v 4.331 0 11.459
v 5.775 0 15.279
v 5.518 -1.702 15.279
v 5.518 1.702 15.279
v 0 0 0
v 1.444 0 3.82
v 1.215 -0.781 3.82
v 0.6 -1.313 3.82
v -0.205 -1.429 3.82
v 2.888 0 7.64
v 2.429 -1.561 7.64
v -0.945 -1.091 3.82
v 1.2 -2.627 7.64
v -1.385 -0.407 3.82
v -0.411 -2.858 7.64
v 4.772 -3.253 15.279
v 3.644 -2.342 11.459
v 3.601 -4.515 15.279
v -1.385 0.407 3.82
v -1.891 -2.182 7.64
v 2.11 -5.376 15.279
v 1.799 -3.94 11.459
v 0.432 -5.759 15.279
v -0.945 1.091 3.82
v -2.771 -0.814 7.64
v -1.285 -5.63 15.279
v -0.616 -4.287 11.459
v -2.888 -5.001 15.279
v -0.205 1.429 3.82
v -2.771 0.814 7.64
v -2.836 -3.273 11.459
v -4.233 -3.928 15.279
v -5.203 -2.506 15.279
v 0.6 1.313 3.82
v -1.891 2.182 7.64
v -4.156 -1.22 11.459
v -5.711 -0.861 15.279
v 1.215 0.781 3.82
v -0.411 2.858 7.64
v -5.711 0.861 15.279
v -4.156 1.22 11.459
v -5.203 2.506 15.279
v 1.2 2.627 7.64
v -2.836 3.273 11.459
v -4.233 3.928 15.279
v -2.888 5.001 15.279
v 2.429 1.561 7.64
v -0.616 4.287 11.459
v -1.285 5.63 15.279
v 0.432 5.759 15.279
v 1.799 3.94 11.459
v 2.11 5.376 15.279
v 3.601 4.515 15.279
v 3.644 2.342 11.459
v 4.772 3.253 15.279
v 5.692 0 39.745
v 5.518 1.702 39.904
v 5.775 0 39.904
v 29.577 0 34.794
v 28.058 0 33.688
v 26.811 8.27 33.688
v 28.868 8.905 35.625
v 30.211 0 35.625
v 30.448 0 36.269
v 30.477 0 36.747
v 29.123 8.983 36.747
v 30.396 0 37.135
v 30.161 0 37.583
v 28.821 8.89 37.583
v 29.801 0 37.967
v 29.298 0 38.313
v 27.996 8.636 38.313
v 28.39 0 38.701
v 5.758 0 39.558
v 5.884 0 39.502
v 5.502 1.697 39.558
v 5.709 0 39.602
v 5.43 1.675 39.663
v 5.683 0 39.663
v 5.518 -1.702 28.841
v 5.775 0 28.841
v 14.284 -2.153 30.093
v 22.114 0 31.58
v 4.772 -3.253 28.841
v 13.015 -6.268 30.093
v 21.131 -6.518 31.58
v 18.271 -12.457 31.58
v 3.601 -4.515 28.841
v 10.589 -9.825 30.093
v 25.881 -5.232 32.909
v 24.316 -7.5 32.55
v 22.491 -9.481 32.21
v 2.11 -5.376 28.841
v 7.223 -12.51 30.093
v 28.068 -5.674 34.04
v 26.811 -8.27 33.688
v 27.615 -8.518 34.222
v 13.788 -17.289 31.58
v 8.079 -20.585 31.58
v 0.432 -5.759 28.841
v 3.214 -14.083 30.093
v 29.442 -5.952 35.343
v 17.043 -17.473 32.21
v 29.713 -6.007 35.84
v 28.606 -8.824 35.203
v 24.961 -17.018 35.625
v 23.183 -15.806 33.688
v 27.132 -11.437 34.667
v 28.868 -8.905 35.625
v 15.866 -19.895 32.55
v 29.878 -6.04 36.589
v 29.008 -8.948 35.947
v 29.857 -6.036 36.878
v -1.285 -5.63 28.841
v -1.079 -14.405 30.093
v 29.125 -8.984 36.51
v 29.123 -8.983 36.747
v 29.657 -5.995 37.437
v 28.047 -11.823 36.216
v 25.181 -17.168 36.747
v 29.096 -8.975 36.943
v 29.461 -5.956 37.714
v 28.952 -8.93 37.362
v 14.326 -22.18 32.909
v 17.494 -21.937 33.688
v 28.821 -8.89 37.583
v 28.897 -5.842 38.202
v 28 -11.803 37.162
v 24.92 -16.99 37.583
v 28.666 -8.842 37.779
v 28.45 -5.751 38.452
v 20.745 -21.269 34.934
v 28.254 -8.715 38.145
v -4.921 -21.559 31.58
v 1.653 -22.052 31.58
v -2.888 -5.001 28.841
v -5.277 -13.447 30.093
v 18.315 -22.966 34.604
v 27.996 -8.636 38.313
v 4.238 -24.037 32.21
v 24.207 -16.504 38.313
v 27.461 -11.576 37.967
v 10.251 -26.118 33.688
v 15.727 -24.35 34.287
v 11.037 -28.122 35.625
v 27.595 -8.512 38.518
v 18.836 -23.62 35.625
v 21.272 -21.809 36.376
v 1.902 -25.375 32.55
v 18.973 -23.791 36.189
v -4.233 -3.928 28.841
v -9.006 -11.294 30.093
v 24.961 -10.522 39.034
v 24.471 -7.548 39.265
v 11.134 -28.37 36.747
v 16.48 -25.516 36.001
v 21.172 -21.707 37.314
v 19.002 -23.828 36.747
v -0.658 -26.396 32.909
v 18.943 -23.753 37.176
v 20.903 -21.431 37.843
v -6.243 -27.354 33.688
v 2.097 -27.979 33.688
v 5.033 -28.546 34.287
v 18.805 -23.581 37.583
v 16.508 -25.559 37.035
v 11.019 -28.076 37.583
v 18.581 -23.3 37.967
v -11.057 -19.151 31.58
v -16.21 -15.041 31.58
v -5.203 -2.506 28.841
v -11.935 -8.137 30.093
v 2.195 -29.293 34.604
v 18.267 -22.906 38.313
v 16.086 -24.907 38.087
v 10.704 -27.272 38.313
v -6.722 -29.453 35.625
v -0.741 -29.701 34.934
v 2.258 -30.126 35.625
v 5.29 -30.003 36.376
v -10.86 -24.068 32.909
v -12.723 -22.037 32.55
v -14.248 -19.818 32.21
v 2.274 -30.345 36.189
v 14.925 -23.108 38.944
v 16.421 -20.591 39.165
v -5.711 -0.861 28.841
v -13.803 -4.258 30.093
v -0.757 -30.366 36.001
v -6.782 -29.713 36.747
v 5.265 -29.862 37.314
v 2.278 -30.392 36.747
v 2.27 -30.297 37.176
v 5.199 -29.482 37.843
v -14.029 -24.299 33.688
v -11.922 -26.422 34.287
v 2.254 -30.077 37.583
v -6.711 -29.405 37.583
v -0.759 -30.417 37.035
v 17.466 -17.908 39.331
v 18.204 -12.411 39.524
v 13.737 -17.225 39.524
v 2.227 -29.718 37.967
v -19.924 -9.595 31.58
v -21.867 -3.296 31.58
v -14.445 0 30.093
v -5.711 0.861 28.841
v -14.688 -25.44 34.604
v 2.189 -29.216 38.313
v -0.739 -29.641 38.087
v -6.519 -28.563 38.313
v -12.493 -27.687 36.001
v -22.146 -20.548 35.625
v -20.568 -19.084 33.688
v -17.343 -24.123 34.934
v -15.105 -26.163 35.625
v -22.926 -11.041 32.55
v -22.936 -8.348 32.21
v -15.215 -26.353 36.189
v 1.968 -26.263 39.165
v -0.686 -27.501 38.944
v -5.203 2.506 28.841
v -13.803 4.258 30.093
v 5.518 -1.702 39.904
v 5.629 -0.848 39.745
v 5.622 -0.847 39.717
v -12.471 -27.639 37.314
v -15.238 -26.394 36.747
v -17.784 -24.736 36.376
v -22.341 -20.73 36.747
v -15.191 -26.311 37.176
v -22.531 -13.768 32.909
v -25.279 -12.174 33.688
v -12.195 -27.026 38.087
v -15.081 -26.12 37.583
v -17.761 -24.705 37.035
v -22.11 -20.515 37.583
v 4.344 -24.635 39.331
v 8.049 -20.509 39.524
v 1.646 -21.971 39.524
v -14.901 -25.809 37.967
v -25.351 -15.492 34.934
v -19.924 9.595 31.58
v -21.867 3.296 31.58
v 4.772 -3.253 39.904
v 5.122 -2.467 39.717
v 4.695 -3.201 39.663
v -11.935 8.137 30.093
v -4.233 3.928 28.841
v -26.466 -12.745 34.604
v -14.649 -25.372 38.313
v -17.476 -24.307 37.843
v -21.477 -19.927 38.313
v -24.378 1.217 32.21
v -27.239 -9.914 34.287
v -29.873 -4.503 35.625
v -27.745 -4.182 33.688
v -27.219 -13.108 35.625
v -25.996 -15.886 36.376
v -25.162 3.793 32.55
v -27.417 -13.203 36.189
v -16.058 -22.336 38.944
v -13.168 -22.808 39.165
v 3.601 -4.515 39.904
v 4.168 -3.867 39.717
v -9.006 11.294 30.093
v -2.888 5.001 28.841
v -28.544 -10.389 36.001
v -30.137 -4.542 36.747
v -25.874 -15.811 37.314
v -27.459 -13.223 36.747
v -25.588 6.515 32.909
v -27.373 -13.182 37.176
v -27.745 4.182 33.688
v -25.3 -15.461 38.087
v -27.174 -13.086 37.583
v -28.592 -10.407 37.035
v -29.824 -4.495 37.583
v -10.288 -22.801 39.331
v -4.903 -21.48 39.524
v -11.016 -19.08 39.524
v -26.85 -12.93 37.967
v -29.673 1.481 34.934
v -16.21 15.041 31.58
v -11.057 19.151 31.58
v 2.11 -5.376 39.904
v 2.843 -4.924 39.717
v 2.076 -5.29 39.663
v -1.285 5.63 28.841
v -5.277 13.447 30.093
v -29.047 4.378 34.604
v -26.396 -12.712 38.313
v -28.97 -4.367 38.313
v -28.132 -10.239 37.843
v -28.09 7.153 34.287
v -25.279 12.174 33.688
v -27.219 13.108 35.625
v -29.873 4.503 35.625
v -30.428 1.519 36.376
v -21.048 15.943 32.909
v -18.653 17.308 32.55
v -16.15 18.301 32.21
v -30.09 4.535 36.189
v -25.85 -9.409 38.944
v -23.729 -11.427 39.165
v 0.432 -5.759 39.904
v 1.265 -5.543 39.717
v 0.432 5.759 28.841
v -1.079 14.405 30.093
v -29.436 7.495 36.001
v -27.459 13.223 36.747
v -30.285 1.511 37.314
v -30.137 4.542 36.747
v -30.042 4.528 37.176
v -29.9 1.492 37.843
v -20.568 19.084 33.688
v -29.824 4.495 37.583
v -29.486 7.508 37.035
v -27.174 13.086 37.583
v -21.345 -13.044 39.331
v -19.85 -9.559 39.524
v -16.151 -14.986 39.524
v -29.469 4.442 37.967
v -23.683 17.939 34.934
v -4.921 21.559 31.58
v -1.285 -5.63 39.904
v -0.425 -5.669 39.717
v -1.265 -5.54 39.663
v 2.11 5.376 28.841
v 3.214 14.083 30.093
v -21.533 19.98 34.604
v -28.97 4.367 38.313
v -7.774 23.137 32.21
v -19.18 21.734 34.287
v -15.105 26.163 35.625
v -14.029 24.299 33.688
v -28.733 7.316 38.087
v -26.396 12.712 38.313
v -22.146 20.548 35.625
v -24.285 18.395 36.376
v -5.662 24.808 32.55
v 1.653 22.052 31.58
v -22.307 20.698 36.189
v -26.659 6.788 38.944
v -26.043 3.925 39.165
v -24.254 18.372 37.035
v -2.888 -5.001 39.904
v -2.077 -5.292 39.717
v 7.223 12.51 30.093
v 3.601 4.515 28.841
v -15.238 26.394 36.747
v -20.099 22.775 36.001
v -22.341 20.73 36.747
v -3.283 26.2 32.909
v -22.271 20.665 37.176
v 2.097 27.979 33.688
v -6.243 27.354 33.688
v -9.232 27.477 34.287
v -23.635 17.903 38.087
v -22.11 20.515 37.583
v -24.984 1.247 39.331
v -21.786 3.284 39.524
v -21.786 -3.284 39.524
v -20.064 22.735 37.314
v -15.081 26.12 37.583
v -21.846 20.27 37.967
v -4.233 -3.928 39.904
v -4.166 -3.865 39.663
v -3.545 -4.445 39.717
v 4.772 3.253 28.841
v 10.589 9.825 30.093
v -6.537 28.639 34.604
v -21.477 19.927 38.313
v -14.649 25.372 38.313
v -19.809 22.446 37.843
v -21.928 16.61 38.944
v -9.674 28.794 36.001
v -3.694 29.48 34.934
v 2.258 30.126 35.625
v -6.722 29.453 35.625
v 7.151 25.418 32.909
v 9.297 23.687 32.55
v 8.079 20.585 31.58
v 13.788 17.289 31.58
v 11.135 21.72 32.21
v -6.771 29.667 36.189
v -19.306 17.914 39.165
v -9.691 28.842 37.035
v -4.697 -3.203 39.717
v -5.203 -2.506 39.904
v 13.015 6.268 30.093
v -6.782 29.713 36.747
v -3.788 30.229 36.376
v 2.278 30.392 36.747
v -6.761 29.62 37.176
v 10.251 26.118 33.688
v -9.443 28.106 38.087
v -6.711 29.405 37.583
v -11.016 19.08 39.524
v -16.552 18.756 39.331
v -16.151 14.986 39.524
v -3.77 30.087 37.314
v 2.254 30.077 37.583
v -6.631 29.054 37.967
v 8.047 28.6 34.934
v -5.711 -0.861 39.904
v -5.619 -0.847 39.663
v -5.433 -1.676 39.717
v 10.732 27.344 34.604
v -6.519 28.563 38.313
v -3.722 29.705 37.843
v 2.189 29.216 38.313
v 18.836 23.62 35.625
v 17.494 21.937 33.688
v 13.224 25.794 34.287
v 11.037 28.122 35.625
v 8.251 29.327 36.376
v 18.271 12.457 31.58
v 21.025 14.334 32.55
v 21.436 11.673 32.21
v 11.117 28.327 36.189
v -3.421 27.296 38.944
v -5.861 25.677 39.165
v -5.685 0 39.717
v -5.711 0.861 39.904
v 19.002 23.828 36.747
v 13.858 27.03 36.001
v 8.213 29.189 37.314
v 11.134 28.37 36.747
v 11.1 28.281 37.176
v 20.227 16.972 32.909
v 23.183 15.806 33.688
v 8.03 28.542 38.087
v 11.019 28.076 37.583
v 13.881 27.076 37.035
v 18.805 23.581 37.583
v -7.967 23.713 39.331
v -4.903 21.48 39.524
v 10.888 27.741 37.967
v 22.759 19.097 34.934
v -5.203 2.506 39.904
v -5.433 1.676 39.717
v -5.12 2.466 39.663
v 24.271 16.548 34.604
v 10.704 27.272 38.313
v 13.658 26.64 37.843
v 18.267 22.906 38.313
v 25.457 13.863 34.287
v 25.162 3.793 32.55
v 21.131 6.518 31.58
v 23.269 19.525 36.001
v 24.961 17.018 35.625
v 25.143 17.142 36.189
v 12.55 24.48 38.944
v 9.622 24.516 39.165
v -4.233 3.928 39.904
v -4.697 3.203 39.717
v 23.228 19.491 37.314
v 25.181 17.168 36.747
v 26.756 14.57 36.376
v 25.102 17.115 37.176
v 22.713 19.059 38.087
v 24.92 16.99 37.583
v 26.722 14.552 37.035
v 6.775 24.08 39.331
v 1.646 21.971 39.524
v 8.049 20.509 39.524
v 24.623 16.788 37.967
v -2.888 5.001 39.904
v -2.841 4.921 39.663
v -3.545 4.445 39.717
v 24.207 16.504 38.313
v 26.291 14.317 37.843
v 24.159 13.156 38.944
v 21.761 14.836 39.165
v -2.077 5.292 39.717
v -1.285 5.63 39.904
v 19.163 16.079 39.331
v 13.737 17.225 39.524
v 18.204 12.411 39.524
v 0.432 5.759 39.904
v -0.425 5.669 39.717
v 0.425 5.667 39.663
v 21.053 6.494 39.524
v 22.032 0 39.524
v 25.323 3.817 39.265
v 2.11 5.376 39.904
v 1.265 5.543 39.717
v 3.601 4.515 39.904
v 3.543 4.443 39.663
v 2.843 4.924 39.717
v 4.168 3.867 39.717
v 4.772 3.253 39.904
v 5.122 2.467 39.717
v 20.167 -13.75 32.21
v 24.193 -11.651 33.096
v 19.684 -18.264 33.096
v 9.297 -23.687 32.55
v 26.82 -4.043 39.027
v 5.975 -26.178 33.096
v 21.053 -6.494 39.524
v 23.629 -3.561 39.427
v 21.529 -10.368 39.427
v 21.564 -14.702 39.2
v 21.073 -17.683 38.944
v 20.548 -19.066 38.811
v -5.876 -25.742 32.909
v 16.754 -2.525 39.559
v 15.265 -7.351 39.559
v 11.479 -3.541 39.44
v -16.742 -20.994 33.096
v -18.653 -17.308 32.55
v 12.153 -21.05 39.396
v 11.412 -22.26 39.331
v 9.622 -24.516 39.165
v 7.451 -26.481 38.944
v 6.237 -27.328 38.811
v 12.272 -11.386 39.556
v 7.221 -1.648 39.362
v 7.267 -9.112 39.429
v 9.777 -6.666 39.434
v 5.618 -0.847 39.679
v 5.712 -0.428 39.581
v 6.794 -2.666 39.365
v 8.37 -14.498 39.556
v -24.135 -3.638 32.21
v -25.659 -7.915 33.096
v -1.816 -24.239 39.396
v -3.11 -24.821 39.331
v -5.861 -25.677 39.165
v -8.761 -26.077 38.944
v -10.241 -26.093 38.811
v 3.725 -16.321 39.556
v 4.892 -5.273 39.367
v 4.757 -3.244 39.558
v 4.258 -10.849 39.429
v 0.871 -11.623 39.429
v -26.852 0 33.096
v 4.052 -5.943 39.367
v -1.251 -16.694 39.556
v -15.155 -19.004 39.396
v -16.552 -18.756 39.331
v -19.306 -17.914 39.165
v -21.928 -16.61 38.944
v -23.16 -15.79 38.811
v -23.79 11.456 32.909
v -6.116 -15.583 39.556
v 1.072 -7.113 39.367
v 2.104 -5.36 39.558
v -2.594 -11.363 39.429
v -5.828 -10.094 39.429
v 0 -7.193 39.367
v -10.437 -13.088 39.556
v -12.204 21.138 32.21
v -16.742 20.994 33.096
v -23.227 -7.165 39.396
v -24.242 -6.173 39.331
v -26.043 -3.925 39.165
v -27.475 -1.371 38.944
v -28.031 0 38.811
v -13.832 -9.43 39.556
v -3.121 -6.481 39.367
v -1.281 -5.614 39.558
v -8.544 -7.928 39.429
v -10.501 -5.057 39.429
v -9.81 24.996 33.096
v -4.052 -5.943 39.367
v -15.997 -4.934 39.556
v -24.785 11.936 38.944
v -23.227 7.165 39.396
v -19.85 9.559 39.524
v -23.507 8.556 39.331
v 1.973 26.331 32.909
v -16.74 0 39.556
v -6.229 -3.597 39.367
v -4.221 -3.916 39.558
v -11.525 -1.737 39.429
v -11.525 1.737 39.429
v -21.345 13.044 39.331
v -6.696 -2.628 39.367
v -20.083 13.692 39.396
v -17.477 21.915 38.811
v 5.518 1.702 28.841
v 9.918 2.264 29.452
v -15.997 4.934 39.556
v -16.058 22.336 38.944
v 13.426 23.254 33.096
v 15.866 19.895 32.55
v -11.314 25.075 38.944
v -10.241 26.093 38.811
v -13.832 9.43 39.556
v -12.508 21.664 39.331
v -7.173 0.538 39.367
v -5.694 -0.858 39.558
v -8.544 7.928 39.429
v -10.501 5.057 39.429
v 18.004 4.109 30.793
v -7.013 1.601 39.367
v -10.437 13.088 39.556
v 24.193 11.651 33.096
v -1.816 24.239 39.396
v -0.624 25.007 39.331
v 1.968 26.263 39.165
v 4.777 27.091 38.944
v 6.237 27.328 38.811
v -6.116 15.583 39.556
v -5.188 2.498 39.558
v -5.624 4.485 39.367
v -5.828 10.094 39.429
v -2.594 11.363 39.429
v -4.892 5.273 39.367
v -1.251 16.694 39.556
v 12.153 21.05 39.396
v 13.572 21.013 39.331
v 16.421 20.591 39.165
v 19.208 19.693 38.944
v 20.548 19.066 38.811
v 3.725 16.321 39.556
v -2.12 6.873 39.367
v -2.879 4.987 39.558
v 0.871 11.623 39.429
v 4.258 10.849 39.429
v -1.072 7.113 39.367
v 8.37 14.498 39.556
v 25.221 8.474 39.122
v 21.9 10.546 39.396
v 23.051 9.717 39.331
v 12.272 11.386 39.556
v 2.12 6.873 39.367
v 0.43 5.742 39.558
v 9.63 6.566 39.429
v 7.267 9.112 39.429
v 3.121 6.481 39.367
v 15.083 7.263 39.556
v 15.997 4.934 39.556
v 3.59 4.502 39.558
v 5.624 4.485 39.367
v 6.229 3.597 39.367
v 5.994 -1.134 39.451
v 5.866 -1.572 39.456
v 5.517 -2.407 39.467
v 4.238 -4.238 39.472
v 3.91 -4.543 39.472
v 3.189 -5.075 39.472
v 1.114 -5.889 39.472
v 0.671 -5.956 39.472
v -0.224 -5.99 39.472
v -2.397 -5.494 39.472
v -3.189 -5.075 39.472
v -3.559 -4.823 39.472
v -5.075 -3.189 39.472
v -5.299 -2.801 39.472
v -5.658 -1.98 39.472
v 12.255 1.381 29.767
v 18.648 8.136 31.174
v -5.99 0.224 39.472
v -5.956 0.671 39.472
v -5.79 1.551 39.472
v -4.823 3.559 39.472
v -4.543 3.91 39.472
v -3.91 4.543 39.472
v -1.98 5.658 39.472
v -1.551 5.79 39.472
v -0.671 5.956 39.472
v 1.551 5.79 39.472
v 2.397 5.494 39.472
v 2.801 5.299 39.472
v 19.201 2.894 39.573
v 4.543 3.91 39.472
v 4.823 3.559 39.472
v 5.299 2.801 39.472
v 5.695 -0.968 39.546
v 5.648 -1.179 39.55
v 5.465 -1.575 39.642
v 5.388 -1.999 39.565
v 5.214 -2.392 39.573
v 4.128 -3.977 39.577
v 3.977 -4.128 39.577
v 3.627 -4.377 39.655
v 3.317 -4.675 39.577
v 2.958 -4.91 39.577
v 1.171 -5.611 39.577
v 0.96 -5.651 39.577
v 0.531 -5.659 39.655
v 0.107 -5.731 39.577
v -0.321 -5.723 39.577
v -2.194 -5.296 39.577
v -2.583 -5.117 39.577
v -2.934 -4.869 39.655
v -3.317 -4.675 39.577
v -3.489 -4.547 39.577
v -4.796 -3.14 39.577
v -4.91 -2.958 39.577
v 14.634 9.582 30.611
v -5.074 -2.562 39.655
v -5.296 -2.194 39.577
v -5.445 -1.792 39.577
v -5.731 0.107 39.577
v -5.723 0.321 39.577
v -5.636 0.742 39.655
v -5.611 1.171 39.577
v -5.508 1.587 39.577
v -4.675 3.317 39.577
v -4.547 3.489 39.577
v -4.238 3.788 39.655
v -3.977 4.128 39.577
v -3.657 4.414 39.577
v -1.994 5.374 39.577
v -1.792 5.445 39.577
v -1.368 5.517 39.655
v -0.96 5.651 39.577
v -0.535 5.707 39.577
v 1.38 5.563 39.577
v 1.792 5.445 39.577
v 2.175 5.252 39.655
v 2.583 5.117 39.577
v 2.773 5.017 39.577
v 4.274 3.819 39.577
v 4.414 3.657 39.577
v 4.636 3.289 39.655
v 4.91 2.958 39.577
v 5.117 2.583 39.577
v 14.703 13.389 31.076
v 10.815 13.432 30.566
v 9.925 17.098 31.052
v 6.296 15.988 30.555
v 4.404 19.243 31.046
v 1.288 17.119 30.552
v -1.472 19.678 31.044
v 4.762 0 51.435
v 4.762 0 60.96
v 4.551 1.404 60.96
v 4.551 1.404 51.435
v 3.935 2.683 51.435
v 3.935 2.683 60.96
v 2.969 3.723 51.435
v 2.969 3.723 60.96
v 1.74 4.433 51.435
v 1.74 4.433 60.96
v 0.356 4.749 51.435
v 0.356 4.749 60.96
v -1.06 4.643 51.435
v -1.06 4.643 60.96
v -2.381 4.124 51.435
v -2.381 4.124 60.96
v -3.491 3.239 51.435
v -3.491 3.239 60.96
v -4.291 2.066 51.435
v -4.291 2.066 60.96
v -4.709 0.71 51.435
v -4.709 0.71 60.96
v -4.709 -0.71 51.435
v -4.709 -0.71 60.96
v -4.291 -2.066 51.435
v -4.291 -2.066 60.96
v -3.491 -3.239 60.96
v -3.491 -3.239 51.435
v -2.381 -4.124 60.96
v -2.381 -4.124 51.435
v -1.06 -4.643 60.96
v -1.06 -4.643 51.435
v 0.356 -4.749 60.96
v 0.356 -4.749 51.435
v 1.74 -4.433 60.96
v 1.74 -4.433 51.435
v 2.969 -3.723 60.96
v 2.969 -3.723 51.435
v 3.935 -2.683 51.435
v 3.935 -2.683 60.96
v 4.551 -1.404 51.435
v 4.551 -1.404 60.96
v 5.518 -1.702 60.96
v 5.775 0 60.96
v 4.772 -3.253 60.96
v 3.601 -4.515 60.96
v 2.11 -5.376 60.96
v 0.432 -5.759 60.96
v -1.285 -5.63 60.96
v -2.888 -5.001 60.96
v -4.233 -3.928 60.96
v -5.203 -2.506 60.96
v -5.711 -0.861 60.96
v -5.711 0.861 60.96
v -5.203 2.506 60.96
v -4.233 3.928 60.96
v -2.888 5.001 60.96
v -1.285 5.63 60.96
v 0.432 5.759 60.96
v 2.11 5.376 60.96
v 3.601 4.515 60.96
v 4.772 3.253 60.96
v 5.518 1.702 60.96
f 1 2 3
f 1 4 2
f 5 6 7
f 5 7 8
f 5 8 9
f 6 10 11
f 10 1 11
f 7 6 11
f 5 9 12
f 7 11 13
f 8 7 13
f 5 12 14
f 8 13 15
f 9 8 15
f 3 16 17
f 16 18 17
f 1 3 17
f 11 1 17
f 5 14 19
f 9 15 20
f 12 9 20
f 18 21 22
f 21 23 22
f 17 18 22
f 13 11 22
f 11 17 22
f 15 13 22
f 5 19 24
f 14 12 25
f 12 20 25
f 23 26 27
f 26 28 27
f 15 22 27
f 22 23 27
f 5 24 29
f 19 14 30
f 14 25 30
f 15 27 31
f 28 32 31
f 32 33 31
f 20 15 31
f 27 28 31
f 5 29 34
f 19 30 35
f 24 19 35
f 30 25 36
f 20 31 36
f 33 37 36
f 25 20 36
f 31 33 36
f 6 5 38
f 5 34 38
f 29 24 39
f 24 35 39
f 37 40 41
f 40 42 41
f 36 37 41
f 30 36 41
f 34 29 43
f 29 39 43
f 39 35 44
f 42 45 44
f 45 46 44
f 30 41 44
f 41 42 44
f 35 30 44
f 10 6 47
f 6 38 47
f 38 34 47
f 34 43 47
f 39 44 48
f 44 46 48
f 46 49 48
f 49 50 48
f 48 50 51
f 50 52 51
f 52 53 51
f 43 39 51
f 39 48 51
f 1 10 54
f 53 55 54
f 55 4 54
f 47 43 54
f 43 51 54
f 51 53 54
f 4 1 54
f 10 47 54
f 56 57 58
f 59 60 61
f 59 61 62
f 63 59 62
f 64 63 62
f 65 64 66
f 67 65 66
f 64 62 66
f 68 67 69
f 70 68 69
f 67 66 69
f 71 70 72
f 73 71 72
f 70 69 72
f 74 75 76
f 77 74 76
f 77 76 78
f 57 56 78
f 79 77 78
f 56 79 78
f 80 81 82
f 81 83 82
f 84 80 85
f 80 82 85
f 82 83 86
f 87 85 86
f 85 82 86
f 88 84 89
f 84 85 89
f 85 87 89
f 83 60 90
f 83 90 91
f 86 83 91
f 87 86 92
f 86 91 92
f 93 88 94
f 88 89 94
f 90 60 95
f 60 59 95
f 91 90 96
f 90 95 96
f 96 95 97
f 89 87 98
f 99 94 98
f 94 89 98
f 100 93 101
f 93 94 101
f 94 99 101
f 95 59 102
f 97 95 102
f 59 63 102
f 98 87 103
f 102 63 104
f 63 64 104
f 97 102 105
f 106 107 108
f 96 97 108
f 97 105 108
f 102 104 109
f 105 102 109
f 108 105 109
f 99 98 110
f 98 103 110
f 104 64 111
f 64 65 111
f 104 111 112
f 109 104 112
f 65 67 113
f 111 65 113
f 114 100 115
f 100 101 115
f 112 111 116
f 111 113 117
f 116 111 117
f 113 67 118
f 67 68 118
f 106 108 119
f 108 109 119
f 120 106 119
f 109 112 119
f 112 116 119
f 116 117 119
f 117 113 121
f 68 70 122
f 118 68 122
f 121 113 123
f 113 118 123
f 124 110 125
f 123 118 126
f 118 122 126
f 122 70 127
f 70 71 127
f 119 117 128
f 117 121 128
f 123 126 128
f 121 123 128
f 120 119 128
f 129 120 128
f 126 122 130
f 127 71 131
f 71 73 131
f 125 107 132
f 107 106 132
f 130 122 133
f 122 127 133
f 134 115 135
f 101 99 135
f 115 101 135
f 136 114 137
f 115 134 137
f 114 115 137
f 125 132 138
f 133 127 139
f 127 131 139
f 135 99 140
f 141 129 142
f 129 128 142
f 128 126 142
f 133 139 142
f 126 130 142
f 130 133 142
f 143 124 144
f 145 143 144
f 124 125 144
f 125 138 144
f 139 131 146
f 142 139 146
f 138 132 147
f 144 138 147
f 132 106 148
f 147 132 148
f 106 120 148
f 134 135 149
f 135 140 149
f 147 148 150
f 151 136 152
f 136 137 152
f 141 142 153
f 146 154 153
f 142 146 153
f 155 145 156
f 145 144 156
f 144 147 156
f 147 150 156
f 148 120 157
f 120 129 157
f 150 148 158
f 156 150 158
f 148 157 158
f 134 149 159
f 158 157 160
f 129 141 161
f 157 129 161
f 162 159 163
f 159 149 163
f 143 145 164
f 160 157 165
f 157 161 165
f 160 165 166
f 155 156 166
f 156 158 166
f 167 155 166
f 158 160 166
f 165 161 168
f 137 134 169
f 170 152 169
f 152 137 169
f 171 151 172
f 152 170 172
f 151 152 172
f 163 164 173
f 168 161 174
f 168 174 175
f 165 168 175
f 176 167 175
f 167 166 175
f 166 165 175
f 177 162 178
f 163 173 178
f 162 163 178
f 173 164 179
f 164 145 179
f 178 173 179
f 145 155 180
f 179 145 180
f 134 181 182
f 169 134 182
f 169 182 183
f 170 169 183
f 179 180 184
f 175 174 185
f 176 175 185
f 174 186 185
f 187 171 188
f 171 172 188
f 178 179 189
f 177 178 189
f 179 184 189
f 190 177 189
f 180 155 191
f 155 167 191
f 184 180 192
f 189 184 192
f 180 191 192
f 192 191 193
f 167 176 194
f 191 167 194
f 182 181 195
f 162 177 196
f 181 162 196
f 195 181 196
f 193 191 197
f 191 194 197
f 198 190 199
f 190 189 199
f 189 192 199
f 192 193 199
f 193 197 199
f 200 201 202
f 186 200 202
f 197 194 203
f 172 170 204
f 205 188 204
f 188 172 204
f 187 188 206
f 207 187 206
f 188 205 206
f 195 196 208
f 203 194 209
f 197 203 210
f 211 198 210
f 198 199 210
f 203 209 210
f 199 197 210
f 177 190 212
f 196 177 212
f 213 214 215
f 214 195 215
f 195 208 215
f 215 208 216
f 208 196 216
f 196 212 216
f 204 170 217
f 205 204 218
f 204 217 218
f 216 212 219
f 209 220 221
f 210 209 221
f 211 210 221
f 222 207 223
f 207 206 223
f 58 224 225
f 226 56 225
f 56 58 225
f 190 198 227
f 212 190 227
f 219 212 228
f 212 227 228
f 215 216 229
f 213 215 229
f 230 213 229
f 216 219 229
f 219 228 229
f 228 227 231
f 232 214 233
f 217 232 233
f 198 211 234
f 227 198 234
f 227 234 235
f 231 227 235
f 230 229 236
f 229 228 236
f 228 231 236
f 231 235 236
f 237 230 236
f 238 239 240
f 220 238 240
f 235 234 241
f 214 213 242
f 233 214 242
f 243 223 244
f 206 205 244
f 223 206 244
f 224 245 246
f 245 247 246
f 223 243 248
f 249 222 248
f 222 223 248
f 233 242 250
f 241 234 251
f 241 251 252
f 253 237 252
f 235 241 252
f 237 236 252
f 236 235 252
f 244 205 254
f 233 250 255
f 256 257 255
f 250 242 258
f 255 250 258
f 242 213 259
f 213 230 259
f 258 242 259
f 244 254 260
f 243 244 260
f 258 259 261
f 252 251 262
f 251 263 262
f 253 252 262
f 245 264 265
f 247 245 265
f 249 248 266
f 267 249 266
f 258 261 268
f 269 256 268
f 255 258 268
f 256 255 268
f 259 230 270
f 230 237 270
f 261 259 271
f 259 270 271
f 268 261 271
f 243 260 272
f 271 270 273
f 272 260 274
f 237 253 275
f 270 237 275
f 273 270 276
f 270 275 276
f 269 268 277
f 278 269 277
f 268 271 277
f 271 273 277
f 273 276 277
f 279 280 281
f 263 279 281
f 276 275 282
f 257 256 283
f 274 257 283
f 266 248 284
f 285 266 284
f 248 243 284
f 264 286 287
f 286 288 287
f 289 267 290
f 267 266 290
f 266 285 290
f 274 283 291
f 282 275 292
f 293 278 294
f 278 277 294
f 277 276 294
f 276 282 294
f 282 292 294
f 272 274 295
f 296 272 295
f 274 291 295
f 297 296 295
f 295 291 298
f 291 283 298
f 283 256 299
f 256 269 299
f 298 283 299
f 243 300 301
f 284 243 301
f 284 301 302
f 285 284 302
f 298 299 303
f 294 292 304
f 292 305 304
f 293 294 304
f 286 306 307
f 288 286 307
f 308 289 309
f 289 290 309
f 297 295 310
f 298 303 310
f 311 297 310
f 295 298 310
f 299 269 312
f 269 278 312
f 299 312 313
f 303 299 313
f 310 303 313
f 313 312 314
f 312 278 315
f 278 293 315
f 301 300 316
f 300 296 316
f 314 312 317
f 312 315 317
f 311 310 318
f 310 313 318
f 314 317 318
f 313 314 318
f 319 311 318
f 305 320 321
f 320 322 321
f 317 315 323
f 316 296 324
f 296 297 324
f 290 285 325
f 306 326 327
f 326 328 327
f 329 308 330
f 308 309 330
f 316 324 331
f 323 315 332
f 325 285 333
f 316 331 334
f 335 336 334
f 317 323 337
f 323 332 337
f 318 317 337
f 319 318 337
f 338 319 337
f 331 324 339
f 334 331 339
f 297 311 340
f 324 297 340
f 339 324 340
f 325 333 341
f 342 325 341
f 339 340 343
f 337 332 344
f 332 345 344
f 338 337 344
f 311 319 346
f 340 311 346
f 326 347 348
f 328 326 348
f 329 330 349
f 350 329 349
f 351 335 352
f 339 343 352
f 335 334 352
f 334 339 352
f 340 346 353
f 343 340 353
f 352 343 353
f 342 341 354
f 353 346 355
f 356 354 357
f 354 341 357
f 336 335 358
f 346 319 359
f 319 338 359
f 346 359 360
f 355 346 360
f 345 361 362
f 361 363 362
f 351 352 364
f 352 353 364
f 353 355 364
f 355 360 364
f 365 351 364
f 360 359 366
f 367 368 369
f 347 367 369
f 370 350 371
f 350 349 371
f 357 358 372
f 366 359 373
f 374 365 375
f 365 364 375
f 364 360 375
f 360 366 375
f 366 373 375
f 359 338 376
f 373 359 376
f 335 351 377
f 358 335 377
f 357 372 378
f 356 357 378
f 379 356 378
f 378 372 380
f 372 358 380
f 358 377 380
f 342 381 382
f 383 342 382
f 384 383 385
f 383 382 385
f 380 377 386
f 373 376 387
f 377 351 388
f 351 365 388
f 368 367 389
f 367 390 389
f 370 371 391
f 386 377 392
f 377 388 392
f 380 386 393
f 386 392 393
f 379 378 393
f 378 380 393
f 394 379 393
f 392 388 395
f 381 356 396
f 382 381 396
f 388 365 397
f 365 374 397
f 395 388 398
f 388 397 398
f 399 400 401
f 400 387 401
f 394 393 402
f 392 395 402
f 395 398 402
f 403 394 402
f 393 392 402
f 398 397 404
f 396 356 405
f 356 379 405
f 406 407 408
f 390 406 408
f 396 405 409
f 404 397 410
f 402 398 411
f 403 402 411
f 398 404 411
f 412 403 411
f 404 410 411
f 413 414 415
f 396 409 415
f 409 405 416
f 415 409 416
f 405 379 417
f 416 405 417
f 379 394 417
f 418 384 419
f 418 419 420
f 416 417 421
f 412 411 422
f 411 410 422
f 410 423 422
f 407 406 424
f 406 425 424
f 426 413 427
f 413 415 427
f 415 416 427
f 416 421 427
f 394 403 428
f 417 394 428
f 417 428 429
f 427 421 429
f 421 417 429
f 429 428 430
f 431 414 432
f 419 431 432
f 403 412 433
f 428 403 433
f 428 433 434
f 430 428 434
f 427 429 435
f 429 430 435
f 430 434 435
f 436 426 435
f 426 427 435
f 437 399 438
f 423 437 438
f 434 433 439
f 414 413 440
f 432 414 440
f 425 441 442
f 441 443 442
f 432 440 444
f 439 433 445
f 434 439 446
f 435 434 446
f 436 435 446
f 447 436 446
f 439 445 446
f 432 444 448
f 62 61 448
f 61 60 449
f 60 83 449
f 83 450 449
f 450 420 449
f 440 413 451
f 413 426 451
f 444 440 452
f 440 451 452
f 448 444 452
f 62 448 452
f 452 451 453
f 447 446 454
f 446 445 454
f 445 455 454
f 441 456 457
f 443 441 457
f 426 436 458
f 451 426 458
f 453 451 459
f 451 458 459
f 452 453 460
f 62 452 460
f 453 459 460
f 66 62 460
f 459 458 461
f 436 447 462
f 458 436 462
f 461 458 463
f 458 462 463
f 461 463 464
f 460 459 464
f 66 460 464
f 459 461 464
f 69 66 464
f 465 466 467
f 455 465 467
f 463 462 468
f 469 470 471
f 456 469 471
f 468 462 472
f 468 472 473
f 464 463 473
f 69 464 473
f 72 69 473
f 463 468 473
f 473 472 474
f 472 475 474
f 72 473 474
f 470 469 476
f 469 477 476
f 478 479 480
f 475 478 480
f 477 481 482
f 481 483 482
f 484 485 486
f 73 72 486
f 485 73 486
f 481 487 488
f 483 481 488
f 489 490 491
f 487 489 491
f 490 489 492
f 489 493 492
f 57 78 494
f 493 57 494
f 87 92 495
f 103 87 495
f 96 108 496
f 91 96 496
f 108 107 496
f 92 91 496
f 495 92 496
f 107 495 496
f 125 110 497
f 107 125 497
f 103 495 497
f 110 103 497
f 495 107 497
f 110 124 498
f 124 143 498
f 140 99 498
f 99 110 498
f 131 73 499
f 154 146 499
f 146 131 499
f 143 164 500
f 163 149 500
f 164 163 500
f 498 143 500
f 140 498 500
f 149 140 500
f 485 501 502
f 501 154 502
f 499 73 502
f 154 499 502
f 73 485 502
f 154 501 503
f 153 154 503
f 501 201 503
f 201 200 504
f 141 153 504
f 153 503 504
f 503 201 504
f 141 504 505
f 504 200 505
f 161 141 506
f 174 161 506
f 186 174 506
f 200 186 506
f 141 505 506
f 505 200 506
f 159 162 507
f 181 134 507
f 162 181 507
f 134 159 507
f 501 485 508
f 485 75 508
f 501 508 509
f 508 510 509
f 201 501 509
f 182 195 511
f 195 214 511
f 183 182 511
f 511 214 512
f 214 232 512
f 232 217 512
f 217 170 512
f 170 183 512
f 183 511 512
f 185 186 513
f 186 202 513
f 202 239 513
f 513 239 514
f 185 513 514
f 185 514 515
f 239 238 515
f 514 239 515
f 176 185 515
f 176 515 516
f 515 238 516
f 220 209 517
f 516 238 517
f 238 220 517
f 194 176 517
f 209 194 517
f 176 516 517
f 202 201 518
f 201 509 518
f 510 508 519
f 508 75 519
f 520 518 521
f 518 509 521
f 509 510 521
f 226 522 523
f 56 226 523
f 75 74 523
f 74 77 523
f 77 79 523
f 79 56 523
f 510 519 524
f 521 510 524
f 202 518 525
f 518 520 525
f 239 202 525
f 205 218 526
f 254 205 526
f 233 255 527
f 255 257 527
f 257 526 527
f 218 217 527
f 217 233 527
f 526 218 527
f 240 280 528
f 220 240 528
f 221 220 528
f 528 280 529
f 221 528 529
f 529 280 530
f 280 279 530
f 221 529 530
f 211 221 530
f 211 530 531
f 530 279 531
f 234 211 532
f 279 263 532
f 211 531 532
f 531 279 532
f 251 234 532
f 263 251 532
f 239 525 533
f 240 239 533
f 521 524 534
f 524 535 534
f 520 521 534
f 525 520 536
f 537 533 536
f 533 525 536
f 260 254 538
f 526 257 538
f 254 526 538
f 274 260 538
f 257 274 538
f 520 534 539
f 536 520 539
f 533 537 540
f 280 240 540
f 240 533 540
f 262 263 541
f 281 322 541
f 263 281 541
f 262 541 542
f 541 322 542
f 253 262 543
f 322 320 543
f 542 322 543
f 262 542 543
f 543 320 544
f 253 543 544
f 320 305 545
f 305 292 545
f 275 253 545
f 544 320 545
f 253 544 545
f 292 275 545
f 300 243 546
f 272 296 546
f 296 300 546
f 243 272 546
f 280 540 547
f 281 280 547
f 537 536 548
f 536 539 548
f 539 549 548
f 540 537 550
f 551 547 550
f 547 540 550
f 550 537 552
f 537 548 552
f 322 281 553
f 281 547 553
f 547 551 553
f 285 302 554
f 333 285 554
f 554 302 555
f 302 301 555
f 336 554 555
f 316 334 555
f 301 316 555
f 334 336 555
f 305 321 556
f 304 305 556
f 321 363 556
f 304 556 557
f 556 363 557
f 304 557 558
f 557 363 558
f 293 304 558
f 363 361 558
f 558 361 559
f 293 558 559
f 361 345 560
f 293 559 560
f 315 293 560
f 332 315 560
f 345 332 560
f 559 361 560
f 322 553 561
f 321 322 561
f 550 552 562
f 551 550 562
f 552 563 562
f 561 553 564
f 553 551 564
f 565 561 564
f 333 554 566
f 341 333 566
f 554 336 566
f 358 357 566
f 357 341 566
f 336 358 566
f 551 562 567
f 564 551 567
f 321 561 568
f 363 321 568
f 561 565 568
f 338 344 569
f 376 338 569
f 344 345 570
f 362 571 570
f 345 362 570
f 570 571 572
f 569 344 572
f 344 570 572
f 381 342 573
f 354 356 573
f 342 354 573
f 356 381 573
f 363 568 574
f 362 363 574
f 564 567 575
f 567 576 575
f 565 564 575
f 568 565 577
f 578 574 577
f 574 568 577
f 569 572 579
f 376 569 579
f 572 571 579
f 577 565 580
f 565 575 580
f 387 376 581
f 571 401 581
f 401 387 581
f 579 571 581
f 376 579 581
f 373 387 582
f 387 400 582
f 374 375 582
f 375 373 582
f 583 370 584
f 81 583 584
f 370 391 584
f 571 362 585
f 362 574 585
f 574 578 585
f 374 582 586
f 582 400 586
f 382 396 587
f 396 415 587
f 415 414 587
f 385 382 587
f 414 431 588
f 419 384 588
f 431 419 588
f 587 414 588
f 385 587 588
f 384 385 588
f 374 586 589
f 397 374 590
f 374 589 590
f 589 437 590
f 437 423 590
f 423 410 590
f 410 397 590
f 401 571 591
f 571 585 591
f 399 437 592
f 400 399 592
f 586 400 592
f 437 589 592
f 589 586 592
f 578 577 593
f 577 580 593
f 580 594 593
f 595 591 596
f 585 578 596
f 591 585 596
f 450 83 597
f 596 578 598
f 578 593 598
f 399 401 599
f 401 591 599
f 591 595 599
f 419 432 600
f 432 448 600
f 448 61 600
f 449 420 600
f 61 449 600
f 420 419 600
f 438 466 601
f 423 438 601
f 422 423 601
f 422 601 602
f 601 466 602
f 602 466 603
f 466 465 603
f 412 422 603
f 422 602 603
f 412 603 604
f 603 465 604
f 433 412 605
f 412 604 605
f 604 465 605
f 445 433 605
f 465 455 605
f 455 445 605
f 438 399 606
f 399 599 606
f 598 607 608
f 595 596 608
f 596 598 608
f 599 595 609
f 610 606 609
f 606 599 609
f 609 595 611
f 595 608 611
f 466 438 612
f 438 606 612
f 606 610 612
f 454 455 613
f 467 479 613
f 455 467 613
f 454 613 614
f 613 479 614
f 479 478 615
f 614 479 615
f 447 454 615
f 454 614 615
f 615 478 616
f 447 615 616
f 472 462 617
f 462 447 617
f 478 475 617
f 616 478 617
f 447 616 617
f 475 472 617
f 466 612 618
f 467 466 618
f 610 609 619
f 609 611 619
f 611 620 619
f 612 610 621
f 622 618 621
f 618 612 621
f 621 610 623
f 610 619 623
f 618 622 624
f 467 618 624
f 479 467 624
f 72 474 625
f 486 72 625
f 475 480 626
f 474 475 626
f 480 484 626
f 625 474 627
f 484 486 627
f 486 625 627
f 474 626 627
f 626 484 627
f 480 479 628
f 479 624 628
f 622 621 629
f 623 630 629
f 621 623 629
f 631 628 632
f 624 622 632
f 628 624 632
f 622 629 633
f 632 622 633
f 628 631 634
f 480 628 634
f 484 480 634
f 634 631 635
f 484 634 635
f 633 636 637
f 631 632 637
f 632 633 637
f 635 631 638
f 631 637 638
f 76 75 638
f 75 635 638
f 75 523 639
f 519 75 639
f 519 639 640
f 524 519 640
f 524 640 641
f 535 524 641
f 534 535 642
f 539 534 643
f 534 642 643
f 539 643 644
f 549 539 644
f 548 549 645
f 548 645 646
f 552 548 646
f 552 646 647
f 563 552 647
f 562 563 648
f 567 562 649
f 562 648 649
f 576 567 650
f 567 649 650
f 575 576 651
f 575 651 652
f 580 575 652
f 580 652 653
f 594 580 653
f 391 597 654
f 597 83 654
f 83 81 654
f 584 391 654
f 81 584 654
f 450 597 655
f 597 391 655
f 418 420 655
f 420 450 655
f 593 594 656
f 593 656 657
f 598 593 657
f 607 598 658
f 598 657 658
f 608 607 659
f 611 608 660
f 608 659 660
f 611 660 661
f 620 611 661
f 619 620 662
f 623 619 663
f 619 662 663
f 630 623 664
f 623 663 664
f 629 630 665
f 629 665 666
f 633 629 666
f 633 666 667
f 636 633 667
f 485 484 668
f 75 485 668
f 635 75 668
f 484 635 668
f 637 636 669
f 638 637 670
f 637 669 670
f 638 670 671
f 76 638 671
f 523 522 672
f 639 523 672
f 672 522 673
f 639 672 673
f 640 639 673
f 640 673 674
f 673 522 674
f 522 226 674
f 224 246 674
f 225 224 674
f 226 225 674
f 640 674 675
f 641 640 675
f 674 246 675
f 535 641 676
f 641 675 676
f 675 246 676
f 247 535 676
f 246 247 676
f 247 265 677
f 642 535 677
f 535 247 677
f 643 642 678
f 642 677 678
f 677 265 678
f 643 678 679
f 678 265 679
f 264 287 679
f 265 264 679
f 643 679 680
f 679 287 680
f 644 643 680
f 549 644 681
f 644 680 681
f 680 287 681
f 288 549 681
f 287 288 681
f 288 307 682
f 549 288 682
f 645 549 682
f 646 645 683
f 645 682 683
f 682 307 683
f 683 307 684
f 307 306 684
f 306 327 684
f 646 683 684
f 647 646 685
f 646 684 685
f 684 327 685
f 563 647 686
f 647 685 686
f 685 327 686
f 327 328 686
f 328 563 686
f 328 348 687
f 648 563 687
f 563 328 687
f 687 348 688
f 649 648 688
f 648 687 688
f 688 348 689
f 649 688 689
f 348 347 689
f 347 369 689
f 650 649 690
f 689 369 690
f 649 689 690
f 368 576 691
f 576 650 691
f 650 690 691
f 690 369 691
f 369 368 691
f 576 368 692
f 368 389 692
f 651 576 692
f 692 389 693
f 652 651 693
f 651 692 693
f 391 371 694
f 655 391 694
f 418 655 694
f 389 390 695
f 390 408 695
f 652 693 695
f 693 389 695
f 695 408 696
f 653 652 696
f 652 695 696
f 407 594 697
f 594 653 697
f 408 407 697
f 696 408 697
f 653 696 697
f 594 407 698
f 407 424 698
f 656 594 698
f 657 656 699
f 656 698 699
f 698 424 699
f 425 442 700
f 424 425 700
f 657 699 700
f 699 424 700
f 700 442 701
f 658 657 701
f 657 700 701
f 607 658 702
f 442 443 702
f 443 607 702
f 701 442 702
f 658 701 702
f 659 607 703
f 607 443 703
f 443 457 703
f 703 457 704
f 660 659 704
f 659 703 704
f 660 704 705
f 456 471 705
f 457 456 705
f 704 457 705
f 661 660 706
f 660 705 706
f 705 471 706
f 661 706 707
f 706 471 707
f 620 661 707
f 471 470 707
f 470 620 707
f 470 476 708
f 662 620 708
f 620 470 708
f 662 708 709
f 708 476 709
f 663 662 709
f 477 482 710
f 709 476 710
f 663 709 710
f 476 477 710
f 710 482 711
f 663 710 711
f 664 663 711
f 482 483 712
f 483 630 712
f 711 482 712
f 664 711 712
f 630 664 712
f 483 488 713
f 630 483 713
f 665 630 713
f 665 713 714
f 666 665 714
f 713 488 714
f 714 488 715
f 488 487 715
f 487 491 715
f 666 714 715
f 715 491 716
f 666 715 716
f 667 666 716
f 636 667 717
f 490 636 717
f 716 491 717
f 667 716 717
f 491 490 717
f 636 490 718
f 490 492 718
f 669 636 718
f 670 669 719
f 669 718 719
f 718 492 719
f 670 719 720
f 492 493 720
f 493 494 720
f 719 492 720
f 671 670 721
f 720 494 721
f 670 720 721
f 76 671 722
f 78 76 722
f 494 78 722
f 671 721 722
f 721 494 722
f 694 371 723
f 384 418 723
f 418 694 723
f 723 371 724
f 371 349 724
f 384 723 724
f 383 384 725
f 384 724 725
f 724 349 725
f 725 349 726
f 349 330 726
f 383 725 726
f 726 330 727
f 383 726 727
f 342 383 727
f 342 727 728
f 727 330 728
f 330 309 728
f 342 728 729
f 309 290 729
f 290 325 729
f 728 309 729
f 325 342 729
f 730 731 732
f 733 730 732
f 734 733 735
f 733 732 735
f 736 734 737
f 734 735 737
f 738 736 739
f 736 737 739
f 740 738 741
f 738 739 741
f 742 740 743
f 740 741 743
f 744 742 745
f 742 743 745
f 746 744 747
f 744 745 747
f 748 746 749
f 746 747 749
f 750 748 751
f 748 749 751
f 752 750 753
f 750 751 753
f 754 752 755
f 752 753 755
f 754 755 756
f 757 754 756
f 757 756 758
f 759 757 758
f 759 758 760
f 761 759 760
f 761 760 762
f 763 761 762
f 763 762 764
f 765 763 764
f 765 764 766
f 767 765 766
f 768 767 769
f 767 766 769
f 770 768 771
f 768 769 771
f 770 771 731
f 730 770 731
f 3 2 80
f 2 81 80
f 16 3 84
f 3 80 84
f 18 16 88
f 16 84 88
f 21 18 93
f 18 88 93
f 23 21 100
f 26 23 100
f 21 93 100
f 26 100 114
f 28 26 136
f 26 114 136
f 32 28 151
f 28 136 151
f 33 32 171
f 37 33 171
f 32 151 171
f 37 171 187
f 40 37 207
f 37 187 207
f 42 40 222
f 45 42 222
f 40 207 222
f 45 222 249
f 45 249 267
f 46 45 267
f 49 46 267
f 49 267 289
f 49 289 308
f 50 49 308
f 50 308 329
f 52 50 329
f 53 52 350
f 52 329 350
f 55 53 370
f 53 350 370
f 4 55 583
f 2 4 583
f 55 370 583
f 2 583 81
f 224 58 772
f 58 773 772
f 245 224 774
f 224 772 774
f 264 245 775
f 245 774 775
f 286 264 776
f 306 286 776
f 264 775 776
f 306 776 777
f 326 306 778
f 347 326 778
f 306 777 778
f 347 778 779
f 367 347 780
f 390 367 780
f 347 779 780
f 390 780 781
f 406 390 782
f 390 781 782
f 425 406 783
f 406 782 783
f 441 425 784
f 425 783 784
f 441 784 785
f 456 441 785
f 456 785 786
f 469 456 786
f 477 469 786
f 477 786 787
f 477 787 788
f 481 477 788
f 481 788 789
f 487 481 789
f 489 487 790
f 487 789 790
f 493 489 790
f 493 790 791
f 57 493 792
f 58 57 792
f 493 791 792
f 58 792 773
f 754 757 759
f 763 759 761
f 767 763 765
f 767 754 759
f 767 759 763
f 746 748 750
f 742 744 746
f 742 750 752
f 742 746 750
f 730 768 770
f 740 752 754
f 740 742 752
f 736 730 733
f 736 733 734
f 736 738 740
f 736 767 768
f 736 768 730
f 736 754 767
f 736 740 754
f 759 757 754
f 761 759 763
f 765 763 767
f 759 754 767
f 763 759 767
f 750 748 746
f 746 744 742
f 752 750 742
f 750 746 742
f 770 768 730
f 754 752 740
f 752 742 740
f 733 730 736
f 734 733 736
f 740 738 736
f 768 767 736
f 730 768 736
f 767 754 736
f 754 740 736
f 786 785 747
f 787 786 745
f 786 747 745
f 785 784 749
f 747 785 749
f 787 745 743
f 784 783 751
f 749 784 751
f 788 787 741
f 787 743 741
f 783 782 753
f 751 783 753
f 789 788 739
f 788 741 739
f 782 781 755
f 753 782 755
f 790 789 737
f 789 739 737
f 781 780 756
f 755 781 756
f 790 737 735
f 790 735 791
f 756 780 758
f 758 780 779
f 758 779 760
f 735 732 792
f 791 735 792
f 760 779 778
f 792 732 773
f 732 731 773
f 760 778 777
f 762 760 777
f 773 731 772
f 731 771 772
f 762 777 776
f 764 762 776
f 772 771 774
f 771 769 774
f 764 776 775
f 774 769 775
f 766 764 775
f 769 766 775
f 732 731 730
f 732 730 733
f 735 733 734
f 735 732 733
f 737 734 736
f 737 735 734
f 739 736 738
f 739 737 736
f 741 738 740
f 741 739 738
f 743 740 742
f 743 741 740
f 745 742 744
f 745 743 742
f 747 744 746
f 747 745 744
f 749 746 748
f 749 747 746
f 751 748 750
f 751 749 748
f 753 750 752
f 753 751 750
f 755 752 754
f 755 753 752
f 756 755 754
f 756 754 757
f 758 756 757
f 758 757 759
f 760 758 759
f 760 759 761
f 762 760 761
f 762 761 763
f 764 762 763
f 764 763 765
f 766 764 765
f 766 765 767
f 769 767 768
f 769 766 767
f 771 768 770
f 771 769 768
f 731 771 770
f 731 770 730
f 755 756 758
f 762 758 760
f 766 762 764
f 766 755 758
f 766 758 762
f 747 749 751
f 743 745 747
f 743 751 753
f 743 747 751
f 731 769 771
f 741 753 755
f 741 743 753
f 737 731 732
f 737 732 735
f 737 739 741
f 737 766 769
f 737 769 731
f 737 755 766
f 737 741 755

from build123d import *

# Parameters (mm, degrees)
F2_R     = 4.7625
F3_DEPTH = 9.525
F4_DEPTH = 9.525


with BuildPart() as f1:
    # F0 (on Front) → F1 (revolve)
    with BuildSketch(Plane.XZ):
        with BuildLine():
            Line((0, 60.96), (0, 0))
            Line((0, 0), (5.775011144, 15.2790336204))
            Line((5.775011144, 15.2790336204), (5.775011144, 28.840571844))
            add(Edge.make_bspline(
                [(5.775011144, 28.840571844), (16.2429383565, 30.2778020596), (30.7316191477, 32.2670755226), (30.9608048096, 41.3707360977), (4.9601585477, 38.5730215847), (5.6940646154, 39.7717218331), (5.775011144, 39.9039330631)],
                knots=[0, 0, 0, 0, 0.4041034384, 0.5593204468, 0.9513950332, 1, 1, 1, 1], degree=3))
            Line((5.775011144, 39.9039330631), (5.775011144, 60.96))
            Line((5.775011144, 60.96), (0, 60.96))
        make_face()
    revolve(axis=Axis((0, 0, 30.48), (0, 0, -1)))

    # F2 (on face) → F3 (cut)
    with BuildSketch(Plane.XY.offset(60.96)):
        Circle(F2_R)
    extrude(amount=-F3_DEPTH, mode=Mode.SUBTRACT)


with BuildPart() as f4:
    # F2 (on face) → F4 (new body)
    with BuildSketch(Plane.XY.offset(60.96)):
        Circle(F2_R)
    extrude(amount=-F4_DEPTH)


solid = Compound([f1.part, f4.part])
